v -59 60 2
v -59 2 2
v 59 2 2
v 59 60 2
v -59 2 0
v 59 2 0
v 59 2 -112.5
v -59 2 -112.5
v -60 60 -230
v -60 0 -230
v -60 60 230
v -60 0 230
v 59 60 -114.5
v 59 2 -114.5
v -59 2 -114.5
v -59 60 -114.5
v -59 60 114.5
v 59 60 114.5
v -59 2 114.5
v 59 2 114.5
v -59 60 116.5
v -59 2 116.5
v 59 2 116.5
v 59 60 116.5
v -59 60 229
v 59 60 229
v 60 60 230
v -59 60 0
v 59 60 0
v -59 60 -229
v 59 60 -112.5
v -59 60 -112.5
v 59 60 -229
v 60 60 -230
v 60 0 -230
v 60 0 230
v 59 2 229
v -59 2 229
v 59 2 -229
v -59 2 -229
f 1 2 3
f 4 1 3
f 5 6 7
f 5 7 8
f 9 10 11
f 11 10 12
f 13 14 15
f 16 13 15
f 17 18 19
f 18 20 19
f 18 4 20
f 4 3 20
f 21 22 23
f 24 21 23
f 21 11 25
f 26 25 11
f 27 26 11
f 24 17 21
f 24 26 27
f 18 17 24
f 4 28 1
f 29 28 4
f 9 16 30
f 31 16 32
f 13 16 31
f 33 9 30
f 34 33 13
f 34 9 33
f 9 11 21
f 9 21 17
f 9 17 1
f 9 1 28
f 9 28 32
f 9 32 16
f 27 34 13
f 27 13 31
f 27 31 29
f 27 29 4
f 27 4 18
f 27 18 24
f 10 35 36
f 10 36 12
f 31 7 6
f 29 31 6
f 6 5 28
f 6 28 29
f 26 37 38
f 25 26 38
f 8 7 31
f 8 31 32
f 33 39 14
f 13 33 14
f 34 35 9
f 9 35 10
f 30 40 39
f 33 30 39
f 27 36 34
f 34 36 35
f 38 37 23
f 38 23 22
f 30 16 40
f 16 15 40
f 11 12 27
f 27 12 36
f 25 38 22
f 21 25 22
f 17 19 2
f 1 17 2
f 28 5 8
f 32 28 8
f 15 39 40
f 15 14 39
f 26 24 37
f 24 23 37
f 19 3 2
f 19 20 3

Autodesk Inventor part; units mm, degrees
ref_plane "YZ Plane" through (0, 0, 0) normal (1, 0, 0) x (0, 1, 0)
ref_plane "XZ Plane" through (0, 0, 0) normal (0, 1, 0) x (-1, 0, 0)
ref_plane "XY Plane" through (0, 0, 0) normal (0, 0, 1) x (1, 0, 0)
sketch "Эскиз1" plane through (0, 0, 0) normal (0, 1, 0) x (-1, 0, 0)
  line L0 (-60, -230) -> (60, -230)
  line L1 (60, -230) -> (60, 230)
  line L2 (60, 230) -> (-60, 230)
  line L3 (-60, 230) -> (-60, -230)
  line L4 (-60, -230) -> (60, 230) construction
  line L5 (60, -230) -> (-60, 230) construction
  point P0 (0, 0)
  dimension "d0" = 120
  dimension "d1" = 460
extrude "Выдавливание1" add sketch "Эскиз1" along normal blind 2
sketch "Эскиз3" plane through (0, 2, 0) normal (0, 1, 0) x (1, 0, 0)
  line L0 (59, -229) -> (-59, -229)
  line L1 (-59, -229) -> (-59, 229)
  line L2 (-59, 229) -> (59, 229)
  line L3 (59, 229) -> (59, -229)
  line L4 (59, -229) -> (-59, 229) construction
  line L5 (-59, -229) -> (59, 229) construction
  line L6 (59, -229) -> (-59, -229)
  line L7 (-59, -229) -> (-59, -116.5)
  line L8 (-59, -116.5) -> (59, -116.5)
  line L9 (59, -116.5) -> (59, -229)
  line L10 (-59, -116.5) -> (59, -116.5)
  line L11 (59, -116.5) -> (59, -114.5)
  line L12 (59, -114.5) -> (-59, -114.5)
  line L13 (-59, -114.5) -> (-59, -116.5)
  line L14 (59, -114.5) -> (-59, -114.5)
  line L15 (-59, -114.5) -> (-59, -2)
  line L16 (-59, -2) -> (59, -2)
  line L17 (59, -2) -> (59, -114.5)
  line L18 (59, -2) -> (-59, -2)
  line L19 (-59, -2) -> (-59, 0)
  line L20 (-59, 0) -> (59, 0)
  line L21 (59, 0) -> (59, -2)
  line L22 (-59, 0) -> (59, 0)
  line L23 (59, 0) -> (59, 112.5)
  line L24 (59, 112.5) -> (-59, 112.5)
  line L25 (-59, 112.5) -> (-59, 0)
  line L26 (-59, 112.5) -> (59, 112.5)
  line L27 (59, 112.5) -> (59, 114.5)
  line L28 (59, 114.5) -> (-59, 114.5)
  line L29 (-59, 114.5) -> (-59, 112.5)
  line L30 (-59, 114.5) -> (59, 114.5)
  line L31 (59, 114.5) -> (59, 229)
  line L32 (59, 229) -> (-59, 229)
  line L33 (-59, 229) -> (-59, 114.5)
  line L34 (-60, 230) -> (-60, -230) projected
  line L35 (60, -230) -> (60, 230) projected
  line L36 (-60, -230) -> (60, -230)
  line L37 (60, -230) -> (60, 230)
  line L38 (60, 230) -> (-60, 230)
  line L39 (-60, 230) -> (-60, -230)
  point P0 (0, 0)
  point P1 (59, -116.5)
  point P2 (59, 0)
  point P3 (-59, 112.5)
  dimension "d14" = 118
  dimension "d15" = 458
  dimension "d16" = 112.5
  dimension "d17" = 118
  dimension "d18" = 2
  dimension "d19" = 118
  dimension "d20" = 112.5
  dimension "d21" = 118
  dimension "d22" = 112.5
  dimension "d23" = 118
  dimension "d24" = 2
extrude "Выдавливание3" add sketch "Эскиз3" along normal blind 58 contours L8 L1 L12 L3 | L16 L1 L20 L3 | L24 L1 L28 L3 | L38 L35 L36 L34
properties part number "коробка ардуинкародина"
